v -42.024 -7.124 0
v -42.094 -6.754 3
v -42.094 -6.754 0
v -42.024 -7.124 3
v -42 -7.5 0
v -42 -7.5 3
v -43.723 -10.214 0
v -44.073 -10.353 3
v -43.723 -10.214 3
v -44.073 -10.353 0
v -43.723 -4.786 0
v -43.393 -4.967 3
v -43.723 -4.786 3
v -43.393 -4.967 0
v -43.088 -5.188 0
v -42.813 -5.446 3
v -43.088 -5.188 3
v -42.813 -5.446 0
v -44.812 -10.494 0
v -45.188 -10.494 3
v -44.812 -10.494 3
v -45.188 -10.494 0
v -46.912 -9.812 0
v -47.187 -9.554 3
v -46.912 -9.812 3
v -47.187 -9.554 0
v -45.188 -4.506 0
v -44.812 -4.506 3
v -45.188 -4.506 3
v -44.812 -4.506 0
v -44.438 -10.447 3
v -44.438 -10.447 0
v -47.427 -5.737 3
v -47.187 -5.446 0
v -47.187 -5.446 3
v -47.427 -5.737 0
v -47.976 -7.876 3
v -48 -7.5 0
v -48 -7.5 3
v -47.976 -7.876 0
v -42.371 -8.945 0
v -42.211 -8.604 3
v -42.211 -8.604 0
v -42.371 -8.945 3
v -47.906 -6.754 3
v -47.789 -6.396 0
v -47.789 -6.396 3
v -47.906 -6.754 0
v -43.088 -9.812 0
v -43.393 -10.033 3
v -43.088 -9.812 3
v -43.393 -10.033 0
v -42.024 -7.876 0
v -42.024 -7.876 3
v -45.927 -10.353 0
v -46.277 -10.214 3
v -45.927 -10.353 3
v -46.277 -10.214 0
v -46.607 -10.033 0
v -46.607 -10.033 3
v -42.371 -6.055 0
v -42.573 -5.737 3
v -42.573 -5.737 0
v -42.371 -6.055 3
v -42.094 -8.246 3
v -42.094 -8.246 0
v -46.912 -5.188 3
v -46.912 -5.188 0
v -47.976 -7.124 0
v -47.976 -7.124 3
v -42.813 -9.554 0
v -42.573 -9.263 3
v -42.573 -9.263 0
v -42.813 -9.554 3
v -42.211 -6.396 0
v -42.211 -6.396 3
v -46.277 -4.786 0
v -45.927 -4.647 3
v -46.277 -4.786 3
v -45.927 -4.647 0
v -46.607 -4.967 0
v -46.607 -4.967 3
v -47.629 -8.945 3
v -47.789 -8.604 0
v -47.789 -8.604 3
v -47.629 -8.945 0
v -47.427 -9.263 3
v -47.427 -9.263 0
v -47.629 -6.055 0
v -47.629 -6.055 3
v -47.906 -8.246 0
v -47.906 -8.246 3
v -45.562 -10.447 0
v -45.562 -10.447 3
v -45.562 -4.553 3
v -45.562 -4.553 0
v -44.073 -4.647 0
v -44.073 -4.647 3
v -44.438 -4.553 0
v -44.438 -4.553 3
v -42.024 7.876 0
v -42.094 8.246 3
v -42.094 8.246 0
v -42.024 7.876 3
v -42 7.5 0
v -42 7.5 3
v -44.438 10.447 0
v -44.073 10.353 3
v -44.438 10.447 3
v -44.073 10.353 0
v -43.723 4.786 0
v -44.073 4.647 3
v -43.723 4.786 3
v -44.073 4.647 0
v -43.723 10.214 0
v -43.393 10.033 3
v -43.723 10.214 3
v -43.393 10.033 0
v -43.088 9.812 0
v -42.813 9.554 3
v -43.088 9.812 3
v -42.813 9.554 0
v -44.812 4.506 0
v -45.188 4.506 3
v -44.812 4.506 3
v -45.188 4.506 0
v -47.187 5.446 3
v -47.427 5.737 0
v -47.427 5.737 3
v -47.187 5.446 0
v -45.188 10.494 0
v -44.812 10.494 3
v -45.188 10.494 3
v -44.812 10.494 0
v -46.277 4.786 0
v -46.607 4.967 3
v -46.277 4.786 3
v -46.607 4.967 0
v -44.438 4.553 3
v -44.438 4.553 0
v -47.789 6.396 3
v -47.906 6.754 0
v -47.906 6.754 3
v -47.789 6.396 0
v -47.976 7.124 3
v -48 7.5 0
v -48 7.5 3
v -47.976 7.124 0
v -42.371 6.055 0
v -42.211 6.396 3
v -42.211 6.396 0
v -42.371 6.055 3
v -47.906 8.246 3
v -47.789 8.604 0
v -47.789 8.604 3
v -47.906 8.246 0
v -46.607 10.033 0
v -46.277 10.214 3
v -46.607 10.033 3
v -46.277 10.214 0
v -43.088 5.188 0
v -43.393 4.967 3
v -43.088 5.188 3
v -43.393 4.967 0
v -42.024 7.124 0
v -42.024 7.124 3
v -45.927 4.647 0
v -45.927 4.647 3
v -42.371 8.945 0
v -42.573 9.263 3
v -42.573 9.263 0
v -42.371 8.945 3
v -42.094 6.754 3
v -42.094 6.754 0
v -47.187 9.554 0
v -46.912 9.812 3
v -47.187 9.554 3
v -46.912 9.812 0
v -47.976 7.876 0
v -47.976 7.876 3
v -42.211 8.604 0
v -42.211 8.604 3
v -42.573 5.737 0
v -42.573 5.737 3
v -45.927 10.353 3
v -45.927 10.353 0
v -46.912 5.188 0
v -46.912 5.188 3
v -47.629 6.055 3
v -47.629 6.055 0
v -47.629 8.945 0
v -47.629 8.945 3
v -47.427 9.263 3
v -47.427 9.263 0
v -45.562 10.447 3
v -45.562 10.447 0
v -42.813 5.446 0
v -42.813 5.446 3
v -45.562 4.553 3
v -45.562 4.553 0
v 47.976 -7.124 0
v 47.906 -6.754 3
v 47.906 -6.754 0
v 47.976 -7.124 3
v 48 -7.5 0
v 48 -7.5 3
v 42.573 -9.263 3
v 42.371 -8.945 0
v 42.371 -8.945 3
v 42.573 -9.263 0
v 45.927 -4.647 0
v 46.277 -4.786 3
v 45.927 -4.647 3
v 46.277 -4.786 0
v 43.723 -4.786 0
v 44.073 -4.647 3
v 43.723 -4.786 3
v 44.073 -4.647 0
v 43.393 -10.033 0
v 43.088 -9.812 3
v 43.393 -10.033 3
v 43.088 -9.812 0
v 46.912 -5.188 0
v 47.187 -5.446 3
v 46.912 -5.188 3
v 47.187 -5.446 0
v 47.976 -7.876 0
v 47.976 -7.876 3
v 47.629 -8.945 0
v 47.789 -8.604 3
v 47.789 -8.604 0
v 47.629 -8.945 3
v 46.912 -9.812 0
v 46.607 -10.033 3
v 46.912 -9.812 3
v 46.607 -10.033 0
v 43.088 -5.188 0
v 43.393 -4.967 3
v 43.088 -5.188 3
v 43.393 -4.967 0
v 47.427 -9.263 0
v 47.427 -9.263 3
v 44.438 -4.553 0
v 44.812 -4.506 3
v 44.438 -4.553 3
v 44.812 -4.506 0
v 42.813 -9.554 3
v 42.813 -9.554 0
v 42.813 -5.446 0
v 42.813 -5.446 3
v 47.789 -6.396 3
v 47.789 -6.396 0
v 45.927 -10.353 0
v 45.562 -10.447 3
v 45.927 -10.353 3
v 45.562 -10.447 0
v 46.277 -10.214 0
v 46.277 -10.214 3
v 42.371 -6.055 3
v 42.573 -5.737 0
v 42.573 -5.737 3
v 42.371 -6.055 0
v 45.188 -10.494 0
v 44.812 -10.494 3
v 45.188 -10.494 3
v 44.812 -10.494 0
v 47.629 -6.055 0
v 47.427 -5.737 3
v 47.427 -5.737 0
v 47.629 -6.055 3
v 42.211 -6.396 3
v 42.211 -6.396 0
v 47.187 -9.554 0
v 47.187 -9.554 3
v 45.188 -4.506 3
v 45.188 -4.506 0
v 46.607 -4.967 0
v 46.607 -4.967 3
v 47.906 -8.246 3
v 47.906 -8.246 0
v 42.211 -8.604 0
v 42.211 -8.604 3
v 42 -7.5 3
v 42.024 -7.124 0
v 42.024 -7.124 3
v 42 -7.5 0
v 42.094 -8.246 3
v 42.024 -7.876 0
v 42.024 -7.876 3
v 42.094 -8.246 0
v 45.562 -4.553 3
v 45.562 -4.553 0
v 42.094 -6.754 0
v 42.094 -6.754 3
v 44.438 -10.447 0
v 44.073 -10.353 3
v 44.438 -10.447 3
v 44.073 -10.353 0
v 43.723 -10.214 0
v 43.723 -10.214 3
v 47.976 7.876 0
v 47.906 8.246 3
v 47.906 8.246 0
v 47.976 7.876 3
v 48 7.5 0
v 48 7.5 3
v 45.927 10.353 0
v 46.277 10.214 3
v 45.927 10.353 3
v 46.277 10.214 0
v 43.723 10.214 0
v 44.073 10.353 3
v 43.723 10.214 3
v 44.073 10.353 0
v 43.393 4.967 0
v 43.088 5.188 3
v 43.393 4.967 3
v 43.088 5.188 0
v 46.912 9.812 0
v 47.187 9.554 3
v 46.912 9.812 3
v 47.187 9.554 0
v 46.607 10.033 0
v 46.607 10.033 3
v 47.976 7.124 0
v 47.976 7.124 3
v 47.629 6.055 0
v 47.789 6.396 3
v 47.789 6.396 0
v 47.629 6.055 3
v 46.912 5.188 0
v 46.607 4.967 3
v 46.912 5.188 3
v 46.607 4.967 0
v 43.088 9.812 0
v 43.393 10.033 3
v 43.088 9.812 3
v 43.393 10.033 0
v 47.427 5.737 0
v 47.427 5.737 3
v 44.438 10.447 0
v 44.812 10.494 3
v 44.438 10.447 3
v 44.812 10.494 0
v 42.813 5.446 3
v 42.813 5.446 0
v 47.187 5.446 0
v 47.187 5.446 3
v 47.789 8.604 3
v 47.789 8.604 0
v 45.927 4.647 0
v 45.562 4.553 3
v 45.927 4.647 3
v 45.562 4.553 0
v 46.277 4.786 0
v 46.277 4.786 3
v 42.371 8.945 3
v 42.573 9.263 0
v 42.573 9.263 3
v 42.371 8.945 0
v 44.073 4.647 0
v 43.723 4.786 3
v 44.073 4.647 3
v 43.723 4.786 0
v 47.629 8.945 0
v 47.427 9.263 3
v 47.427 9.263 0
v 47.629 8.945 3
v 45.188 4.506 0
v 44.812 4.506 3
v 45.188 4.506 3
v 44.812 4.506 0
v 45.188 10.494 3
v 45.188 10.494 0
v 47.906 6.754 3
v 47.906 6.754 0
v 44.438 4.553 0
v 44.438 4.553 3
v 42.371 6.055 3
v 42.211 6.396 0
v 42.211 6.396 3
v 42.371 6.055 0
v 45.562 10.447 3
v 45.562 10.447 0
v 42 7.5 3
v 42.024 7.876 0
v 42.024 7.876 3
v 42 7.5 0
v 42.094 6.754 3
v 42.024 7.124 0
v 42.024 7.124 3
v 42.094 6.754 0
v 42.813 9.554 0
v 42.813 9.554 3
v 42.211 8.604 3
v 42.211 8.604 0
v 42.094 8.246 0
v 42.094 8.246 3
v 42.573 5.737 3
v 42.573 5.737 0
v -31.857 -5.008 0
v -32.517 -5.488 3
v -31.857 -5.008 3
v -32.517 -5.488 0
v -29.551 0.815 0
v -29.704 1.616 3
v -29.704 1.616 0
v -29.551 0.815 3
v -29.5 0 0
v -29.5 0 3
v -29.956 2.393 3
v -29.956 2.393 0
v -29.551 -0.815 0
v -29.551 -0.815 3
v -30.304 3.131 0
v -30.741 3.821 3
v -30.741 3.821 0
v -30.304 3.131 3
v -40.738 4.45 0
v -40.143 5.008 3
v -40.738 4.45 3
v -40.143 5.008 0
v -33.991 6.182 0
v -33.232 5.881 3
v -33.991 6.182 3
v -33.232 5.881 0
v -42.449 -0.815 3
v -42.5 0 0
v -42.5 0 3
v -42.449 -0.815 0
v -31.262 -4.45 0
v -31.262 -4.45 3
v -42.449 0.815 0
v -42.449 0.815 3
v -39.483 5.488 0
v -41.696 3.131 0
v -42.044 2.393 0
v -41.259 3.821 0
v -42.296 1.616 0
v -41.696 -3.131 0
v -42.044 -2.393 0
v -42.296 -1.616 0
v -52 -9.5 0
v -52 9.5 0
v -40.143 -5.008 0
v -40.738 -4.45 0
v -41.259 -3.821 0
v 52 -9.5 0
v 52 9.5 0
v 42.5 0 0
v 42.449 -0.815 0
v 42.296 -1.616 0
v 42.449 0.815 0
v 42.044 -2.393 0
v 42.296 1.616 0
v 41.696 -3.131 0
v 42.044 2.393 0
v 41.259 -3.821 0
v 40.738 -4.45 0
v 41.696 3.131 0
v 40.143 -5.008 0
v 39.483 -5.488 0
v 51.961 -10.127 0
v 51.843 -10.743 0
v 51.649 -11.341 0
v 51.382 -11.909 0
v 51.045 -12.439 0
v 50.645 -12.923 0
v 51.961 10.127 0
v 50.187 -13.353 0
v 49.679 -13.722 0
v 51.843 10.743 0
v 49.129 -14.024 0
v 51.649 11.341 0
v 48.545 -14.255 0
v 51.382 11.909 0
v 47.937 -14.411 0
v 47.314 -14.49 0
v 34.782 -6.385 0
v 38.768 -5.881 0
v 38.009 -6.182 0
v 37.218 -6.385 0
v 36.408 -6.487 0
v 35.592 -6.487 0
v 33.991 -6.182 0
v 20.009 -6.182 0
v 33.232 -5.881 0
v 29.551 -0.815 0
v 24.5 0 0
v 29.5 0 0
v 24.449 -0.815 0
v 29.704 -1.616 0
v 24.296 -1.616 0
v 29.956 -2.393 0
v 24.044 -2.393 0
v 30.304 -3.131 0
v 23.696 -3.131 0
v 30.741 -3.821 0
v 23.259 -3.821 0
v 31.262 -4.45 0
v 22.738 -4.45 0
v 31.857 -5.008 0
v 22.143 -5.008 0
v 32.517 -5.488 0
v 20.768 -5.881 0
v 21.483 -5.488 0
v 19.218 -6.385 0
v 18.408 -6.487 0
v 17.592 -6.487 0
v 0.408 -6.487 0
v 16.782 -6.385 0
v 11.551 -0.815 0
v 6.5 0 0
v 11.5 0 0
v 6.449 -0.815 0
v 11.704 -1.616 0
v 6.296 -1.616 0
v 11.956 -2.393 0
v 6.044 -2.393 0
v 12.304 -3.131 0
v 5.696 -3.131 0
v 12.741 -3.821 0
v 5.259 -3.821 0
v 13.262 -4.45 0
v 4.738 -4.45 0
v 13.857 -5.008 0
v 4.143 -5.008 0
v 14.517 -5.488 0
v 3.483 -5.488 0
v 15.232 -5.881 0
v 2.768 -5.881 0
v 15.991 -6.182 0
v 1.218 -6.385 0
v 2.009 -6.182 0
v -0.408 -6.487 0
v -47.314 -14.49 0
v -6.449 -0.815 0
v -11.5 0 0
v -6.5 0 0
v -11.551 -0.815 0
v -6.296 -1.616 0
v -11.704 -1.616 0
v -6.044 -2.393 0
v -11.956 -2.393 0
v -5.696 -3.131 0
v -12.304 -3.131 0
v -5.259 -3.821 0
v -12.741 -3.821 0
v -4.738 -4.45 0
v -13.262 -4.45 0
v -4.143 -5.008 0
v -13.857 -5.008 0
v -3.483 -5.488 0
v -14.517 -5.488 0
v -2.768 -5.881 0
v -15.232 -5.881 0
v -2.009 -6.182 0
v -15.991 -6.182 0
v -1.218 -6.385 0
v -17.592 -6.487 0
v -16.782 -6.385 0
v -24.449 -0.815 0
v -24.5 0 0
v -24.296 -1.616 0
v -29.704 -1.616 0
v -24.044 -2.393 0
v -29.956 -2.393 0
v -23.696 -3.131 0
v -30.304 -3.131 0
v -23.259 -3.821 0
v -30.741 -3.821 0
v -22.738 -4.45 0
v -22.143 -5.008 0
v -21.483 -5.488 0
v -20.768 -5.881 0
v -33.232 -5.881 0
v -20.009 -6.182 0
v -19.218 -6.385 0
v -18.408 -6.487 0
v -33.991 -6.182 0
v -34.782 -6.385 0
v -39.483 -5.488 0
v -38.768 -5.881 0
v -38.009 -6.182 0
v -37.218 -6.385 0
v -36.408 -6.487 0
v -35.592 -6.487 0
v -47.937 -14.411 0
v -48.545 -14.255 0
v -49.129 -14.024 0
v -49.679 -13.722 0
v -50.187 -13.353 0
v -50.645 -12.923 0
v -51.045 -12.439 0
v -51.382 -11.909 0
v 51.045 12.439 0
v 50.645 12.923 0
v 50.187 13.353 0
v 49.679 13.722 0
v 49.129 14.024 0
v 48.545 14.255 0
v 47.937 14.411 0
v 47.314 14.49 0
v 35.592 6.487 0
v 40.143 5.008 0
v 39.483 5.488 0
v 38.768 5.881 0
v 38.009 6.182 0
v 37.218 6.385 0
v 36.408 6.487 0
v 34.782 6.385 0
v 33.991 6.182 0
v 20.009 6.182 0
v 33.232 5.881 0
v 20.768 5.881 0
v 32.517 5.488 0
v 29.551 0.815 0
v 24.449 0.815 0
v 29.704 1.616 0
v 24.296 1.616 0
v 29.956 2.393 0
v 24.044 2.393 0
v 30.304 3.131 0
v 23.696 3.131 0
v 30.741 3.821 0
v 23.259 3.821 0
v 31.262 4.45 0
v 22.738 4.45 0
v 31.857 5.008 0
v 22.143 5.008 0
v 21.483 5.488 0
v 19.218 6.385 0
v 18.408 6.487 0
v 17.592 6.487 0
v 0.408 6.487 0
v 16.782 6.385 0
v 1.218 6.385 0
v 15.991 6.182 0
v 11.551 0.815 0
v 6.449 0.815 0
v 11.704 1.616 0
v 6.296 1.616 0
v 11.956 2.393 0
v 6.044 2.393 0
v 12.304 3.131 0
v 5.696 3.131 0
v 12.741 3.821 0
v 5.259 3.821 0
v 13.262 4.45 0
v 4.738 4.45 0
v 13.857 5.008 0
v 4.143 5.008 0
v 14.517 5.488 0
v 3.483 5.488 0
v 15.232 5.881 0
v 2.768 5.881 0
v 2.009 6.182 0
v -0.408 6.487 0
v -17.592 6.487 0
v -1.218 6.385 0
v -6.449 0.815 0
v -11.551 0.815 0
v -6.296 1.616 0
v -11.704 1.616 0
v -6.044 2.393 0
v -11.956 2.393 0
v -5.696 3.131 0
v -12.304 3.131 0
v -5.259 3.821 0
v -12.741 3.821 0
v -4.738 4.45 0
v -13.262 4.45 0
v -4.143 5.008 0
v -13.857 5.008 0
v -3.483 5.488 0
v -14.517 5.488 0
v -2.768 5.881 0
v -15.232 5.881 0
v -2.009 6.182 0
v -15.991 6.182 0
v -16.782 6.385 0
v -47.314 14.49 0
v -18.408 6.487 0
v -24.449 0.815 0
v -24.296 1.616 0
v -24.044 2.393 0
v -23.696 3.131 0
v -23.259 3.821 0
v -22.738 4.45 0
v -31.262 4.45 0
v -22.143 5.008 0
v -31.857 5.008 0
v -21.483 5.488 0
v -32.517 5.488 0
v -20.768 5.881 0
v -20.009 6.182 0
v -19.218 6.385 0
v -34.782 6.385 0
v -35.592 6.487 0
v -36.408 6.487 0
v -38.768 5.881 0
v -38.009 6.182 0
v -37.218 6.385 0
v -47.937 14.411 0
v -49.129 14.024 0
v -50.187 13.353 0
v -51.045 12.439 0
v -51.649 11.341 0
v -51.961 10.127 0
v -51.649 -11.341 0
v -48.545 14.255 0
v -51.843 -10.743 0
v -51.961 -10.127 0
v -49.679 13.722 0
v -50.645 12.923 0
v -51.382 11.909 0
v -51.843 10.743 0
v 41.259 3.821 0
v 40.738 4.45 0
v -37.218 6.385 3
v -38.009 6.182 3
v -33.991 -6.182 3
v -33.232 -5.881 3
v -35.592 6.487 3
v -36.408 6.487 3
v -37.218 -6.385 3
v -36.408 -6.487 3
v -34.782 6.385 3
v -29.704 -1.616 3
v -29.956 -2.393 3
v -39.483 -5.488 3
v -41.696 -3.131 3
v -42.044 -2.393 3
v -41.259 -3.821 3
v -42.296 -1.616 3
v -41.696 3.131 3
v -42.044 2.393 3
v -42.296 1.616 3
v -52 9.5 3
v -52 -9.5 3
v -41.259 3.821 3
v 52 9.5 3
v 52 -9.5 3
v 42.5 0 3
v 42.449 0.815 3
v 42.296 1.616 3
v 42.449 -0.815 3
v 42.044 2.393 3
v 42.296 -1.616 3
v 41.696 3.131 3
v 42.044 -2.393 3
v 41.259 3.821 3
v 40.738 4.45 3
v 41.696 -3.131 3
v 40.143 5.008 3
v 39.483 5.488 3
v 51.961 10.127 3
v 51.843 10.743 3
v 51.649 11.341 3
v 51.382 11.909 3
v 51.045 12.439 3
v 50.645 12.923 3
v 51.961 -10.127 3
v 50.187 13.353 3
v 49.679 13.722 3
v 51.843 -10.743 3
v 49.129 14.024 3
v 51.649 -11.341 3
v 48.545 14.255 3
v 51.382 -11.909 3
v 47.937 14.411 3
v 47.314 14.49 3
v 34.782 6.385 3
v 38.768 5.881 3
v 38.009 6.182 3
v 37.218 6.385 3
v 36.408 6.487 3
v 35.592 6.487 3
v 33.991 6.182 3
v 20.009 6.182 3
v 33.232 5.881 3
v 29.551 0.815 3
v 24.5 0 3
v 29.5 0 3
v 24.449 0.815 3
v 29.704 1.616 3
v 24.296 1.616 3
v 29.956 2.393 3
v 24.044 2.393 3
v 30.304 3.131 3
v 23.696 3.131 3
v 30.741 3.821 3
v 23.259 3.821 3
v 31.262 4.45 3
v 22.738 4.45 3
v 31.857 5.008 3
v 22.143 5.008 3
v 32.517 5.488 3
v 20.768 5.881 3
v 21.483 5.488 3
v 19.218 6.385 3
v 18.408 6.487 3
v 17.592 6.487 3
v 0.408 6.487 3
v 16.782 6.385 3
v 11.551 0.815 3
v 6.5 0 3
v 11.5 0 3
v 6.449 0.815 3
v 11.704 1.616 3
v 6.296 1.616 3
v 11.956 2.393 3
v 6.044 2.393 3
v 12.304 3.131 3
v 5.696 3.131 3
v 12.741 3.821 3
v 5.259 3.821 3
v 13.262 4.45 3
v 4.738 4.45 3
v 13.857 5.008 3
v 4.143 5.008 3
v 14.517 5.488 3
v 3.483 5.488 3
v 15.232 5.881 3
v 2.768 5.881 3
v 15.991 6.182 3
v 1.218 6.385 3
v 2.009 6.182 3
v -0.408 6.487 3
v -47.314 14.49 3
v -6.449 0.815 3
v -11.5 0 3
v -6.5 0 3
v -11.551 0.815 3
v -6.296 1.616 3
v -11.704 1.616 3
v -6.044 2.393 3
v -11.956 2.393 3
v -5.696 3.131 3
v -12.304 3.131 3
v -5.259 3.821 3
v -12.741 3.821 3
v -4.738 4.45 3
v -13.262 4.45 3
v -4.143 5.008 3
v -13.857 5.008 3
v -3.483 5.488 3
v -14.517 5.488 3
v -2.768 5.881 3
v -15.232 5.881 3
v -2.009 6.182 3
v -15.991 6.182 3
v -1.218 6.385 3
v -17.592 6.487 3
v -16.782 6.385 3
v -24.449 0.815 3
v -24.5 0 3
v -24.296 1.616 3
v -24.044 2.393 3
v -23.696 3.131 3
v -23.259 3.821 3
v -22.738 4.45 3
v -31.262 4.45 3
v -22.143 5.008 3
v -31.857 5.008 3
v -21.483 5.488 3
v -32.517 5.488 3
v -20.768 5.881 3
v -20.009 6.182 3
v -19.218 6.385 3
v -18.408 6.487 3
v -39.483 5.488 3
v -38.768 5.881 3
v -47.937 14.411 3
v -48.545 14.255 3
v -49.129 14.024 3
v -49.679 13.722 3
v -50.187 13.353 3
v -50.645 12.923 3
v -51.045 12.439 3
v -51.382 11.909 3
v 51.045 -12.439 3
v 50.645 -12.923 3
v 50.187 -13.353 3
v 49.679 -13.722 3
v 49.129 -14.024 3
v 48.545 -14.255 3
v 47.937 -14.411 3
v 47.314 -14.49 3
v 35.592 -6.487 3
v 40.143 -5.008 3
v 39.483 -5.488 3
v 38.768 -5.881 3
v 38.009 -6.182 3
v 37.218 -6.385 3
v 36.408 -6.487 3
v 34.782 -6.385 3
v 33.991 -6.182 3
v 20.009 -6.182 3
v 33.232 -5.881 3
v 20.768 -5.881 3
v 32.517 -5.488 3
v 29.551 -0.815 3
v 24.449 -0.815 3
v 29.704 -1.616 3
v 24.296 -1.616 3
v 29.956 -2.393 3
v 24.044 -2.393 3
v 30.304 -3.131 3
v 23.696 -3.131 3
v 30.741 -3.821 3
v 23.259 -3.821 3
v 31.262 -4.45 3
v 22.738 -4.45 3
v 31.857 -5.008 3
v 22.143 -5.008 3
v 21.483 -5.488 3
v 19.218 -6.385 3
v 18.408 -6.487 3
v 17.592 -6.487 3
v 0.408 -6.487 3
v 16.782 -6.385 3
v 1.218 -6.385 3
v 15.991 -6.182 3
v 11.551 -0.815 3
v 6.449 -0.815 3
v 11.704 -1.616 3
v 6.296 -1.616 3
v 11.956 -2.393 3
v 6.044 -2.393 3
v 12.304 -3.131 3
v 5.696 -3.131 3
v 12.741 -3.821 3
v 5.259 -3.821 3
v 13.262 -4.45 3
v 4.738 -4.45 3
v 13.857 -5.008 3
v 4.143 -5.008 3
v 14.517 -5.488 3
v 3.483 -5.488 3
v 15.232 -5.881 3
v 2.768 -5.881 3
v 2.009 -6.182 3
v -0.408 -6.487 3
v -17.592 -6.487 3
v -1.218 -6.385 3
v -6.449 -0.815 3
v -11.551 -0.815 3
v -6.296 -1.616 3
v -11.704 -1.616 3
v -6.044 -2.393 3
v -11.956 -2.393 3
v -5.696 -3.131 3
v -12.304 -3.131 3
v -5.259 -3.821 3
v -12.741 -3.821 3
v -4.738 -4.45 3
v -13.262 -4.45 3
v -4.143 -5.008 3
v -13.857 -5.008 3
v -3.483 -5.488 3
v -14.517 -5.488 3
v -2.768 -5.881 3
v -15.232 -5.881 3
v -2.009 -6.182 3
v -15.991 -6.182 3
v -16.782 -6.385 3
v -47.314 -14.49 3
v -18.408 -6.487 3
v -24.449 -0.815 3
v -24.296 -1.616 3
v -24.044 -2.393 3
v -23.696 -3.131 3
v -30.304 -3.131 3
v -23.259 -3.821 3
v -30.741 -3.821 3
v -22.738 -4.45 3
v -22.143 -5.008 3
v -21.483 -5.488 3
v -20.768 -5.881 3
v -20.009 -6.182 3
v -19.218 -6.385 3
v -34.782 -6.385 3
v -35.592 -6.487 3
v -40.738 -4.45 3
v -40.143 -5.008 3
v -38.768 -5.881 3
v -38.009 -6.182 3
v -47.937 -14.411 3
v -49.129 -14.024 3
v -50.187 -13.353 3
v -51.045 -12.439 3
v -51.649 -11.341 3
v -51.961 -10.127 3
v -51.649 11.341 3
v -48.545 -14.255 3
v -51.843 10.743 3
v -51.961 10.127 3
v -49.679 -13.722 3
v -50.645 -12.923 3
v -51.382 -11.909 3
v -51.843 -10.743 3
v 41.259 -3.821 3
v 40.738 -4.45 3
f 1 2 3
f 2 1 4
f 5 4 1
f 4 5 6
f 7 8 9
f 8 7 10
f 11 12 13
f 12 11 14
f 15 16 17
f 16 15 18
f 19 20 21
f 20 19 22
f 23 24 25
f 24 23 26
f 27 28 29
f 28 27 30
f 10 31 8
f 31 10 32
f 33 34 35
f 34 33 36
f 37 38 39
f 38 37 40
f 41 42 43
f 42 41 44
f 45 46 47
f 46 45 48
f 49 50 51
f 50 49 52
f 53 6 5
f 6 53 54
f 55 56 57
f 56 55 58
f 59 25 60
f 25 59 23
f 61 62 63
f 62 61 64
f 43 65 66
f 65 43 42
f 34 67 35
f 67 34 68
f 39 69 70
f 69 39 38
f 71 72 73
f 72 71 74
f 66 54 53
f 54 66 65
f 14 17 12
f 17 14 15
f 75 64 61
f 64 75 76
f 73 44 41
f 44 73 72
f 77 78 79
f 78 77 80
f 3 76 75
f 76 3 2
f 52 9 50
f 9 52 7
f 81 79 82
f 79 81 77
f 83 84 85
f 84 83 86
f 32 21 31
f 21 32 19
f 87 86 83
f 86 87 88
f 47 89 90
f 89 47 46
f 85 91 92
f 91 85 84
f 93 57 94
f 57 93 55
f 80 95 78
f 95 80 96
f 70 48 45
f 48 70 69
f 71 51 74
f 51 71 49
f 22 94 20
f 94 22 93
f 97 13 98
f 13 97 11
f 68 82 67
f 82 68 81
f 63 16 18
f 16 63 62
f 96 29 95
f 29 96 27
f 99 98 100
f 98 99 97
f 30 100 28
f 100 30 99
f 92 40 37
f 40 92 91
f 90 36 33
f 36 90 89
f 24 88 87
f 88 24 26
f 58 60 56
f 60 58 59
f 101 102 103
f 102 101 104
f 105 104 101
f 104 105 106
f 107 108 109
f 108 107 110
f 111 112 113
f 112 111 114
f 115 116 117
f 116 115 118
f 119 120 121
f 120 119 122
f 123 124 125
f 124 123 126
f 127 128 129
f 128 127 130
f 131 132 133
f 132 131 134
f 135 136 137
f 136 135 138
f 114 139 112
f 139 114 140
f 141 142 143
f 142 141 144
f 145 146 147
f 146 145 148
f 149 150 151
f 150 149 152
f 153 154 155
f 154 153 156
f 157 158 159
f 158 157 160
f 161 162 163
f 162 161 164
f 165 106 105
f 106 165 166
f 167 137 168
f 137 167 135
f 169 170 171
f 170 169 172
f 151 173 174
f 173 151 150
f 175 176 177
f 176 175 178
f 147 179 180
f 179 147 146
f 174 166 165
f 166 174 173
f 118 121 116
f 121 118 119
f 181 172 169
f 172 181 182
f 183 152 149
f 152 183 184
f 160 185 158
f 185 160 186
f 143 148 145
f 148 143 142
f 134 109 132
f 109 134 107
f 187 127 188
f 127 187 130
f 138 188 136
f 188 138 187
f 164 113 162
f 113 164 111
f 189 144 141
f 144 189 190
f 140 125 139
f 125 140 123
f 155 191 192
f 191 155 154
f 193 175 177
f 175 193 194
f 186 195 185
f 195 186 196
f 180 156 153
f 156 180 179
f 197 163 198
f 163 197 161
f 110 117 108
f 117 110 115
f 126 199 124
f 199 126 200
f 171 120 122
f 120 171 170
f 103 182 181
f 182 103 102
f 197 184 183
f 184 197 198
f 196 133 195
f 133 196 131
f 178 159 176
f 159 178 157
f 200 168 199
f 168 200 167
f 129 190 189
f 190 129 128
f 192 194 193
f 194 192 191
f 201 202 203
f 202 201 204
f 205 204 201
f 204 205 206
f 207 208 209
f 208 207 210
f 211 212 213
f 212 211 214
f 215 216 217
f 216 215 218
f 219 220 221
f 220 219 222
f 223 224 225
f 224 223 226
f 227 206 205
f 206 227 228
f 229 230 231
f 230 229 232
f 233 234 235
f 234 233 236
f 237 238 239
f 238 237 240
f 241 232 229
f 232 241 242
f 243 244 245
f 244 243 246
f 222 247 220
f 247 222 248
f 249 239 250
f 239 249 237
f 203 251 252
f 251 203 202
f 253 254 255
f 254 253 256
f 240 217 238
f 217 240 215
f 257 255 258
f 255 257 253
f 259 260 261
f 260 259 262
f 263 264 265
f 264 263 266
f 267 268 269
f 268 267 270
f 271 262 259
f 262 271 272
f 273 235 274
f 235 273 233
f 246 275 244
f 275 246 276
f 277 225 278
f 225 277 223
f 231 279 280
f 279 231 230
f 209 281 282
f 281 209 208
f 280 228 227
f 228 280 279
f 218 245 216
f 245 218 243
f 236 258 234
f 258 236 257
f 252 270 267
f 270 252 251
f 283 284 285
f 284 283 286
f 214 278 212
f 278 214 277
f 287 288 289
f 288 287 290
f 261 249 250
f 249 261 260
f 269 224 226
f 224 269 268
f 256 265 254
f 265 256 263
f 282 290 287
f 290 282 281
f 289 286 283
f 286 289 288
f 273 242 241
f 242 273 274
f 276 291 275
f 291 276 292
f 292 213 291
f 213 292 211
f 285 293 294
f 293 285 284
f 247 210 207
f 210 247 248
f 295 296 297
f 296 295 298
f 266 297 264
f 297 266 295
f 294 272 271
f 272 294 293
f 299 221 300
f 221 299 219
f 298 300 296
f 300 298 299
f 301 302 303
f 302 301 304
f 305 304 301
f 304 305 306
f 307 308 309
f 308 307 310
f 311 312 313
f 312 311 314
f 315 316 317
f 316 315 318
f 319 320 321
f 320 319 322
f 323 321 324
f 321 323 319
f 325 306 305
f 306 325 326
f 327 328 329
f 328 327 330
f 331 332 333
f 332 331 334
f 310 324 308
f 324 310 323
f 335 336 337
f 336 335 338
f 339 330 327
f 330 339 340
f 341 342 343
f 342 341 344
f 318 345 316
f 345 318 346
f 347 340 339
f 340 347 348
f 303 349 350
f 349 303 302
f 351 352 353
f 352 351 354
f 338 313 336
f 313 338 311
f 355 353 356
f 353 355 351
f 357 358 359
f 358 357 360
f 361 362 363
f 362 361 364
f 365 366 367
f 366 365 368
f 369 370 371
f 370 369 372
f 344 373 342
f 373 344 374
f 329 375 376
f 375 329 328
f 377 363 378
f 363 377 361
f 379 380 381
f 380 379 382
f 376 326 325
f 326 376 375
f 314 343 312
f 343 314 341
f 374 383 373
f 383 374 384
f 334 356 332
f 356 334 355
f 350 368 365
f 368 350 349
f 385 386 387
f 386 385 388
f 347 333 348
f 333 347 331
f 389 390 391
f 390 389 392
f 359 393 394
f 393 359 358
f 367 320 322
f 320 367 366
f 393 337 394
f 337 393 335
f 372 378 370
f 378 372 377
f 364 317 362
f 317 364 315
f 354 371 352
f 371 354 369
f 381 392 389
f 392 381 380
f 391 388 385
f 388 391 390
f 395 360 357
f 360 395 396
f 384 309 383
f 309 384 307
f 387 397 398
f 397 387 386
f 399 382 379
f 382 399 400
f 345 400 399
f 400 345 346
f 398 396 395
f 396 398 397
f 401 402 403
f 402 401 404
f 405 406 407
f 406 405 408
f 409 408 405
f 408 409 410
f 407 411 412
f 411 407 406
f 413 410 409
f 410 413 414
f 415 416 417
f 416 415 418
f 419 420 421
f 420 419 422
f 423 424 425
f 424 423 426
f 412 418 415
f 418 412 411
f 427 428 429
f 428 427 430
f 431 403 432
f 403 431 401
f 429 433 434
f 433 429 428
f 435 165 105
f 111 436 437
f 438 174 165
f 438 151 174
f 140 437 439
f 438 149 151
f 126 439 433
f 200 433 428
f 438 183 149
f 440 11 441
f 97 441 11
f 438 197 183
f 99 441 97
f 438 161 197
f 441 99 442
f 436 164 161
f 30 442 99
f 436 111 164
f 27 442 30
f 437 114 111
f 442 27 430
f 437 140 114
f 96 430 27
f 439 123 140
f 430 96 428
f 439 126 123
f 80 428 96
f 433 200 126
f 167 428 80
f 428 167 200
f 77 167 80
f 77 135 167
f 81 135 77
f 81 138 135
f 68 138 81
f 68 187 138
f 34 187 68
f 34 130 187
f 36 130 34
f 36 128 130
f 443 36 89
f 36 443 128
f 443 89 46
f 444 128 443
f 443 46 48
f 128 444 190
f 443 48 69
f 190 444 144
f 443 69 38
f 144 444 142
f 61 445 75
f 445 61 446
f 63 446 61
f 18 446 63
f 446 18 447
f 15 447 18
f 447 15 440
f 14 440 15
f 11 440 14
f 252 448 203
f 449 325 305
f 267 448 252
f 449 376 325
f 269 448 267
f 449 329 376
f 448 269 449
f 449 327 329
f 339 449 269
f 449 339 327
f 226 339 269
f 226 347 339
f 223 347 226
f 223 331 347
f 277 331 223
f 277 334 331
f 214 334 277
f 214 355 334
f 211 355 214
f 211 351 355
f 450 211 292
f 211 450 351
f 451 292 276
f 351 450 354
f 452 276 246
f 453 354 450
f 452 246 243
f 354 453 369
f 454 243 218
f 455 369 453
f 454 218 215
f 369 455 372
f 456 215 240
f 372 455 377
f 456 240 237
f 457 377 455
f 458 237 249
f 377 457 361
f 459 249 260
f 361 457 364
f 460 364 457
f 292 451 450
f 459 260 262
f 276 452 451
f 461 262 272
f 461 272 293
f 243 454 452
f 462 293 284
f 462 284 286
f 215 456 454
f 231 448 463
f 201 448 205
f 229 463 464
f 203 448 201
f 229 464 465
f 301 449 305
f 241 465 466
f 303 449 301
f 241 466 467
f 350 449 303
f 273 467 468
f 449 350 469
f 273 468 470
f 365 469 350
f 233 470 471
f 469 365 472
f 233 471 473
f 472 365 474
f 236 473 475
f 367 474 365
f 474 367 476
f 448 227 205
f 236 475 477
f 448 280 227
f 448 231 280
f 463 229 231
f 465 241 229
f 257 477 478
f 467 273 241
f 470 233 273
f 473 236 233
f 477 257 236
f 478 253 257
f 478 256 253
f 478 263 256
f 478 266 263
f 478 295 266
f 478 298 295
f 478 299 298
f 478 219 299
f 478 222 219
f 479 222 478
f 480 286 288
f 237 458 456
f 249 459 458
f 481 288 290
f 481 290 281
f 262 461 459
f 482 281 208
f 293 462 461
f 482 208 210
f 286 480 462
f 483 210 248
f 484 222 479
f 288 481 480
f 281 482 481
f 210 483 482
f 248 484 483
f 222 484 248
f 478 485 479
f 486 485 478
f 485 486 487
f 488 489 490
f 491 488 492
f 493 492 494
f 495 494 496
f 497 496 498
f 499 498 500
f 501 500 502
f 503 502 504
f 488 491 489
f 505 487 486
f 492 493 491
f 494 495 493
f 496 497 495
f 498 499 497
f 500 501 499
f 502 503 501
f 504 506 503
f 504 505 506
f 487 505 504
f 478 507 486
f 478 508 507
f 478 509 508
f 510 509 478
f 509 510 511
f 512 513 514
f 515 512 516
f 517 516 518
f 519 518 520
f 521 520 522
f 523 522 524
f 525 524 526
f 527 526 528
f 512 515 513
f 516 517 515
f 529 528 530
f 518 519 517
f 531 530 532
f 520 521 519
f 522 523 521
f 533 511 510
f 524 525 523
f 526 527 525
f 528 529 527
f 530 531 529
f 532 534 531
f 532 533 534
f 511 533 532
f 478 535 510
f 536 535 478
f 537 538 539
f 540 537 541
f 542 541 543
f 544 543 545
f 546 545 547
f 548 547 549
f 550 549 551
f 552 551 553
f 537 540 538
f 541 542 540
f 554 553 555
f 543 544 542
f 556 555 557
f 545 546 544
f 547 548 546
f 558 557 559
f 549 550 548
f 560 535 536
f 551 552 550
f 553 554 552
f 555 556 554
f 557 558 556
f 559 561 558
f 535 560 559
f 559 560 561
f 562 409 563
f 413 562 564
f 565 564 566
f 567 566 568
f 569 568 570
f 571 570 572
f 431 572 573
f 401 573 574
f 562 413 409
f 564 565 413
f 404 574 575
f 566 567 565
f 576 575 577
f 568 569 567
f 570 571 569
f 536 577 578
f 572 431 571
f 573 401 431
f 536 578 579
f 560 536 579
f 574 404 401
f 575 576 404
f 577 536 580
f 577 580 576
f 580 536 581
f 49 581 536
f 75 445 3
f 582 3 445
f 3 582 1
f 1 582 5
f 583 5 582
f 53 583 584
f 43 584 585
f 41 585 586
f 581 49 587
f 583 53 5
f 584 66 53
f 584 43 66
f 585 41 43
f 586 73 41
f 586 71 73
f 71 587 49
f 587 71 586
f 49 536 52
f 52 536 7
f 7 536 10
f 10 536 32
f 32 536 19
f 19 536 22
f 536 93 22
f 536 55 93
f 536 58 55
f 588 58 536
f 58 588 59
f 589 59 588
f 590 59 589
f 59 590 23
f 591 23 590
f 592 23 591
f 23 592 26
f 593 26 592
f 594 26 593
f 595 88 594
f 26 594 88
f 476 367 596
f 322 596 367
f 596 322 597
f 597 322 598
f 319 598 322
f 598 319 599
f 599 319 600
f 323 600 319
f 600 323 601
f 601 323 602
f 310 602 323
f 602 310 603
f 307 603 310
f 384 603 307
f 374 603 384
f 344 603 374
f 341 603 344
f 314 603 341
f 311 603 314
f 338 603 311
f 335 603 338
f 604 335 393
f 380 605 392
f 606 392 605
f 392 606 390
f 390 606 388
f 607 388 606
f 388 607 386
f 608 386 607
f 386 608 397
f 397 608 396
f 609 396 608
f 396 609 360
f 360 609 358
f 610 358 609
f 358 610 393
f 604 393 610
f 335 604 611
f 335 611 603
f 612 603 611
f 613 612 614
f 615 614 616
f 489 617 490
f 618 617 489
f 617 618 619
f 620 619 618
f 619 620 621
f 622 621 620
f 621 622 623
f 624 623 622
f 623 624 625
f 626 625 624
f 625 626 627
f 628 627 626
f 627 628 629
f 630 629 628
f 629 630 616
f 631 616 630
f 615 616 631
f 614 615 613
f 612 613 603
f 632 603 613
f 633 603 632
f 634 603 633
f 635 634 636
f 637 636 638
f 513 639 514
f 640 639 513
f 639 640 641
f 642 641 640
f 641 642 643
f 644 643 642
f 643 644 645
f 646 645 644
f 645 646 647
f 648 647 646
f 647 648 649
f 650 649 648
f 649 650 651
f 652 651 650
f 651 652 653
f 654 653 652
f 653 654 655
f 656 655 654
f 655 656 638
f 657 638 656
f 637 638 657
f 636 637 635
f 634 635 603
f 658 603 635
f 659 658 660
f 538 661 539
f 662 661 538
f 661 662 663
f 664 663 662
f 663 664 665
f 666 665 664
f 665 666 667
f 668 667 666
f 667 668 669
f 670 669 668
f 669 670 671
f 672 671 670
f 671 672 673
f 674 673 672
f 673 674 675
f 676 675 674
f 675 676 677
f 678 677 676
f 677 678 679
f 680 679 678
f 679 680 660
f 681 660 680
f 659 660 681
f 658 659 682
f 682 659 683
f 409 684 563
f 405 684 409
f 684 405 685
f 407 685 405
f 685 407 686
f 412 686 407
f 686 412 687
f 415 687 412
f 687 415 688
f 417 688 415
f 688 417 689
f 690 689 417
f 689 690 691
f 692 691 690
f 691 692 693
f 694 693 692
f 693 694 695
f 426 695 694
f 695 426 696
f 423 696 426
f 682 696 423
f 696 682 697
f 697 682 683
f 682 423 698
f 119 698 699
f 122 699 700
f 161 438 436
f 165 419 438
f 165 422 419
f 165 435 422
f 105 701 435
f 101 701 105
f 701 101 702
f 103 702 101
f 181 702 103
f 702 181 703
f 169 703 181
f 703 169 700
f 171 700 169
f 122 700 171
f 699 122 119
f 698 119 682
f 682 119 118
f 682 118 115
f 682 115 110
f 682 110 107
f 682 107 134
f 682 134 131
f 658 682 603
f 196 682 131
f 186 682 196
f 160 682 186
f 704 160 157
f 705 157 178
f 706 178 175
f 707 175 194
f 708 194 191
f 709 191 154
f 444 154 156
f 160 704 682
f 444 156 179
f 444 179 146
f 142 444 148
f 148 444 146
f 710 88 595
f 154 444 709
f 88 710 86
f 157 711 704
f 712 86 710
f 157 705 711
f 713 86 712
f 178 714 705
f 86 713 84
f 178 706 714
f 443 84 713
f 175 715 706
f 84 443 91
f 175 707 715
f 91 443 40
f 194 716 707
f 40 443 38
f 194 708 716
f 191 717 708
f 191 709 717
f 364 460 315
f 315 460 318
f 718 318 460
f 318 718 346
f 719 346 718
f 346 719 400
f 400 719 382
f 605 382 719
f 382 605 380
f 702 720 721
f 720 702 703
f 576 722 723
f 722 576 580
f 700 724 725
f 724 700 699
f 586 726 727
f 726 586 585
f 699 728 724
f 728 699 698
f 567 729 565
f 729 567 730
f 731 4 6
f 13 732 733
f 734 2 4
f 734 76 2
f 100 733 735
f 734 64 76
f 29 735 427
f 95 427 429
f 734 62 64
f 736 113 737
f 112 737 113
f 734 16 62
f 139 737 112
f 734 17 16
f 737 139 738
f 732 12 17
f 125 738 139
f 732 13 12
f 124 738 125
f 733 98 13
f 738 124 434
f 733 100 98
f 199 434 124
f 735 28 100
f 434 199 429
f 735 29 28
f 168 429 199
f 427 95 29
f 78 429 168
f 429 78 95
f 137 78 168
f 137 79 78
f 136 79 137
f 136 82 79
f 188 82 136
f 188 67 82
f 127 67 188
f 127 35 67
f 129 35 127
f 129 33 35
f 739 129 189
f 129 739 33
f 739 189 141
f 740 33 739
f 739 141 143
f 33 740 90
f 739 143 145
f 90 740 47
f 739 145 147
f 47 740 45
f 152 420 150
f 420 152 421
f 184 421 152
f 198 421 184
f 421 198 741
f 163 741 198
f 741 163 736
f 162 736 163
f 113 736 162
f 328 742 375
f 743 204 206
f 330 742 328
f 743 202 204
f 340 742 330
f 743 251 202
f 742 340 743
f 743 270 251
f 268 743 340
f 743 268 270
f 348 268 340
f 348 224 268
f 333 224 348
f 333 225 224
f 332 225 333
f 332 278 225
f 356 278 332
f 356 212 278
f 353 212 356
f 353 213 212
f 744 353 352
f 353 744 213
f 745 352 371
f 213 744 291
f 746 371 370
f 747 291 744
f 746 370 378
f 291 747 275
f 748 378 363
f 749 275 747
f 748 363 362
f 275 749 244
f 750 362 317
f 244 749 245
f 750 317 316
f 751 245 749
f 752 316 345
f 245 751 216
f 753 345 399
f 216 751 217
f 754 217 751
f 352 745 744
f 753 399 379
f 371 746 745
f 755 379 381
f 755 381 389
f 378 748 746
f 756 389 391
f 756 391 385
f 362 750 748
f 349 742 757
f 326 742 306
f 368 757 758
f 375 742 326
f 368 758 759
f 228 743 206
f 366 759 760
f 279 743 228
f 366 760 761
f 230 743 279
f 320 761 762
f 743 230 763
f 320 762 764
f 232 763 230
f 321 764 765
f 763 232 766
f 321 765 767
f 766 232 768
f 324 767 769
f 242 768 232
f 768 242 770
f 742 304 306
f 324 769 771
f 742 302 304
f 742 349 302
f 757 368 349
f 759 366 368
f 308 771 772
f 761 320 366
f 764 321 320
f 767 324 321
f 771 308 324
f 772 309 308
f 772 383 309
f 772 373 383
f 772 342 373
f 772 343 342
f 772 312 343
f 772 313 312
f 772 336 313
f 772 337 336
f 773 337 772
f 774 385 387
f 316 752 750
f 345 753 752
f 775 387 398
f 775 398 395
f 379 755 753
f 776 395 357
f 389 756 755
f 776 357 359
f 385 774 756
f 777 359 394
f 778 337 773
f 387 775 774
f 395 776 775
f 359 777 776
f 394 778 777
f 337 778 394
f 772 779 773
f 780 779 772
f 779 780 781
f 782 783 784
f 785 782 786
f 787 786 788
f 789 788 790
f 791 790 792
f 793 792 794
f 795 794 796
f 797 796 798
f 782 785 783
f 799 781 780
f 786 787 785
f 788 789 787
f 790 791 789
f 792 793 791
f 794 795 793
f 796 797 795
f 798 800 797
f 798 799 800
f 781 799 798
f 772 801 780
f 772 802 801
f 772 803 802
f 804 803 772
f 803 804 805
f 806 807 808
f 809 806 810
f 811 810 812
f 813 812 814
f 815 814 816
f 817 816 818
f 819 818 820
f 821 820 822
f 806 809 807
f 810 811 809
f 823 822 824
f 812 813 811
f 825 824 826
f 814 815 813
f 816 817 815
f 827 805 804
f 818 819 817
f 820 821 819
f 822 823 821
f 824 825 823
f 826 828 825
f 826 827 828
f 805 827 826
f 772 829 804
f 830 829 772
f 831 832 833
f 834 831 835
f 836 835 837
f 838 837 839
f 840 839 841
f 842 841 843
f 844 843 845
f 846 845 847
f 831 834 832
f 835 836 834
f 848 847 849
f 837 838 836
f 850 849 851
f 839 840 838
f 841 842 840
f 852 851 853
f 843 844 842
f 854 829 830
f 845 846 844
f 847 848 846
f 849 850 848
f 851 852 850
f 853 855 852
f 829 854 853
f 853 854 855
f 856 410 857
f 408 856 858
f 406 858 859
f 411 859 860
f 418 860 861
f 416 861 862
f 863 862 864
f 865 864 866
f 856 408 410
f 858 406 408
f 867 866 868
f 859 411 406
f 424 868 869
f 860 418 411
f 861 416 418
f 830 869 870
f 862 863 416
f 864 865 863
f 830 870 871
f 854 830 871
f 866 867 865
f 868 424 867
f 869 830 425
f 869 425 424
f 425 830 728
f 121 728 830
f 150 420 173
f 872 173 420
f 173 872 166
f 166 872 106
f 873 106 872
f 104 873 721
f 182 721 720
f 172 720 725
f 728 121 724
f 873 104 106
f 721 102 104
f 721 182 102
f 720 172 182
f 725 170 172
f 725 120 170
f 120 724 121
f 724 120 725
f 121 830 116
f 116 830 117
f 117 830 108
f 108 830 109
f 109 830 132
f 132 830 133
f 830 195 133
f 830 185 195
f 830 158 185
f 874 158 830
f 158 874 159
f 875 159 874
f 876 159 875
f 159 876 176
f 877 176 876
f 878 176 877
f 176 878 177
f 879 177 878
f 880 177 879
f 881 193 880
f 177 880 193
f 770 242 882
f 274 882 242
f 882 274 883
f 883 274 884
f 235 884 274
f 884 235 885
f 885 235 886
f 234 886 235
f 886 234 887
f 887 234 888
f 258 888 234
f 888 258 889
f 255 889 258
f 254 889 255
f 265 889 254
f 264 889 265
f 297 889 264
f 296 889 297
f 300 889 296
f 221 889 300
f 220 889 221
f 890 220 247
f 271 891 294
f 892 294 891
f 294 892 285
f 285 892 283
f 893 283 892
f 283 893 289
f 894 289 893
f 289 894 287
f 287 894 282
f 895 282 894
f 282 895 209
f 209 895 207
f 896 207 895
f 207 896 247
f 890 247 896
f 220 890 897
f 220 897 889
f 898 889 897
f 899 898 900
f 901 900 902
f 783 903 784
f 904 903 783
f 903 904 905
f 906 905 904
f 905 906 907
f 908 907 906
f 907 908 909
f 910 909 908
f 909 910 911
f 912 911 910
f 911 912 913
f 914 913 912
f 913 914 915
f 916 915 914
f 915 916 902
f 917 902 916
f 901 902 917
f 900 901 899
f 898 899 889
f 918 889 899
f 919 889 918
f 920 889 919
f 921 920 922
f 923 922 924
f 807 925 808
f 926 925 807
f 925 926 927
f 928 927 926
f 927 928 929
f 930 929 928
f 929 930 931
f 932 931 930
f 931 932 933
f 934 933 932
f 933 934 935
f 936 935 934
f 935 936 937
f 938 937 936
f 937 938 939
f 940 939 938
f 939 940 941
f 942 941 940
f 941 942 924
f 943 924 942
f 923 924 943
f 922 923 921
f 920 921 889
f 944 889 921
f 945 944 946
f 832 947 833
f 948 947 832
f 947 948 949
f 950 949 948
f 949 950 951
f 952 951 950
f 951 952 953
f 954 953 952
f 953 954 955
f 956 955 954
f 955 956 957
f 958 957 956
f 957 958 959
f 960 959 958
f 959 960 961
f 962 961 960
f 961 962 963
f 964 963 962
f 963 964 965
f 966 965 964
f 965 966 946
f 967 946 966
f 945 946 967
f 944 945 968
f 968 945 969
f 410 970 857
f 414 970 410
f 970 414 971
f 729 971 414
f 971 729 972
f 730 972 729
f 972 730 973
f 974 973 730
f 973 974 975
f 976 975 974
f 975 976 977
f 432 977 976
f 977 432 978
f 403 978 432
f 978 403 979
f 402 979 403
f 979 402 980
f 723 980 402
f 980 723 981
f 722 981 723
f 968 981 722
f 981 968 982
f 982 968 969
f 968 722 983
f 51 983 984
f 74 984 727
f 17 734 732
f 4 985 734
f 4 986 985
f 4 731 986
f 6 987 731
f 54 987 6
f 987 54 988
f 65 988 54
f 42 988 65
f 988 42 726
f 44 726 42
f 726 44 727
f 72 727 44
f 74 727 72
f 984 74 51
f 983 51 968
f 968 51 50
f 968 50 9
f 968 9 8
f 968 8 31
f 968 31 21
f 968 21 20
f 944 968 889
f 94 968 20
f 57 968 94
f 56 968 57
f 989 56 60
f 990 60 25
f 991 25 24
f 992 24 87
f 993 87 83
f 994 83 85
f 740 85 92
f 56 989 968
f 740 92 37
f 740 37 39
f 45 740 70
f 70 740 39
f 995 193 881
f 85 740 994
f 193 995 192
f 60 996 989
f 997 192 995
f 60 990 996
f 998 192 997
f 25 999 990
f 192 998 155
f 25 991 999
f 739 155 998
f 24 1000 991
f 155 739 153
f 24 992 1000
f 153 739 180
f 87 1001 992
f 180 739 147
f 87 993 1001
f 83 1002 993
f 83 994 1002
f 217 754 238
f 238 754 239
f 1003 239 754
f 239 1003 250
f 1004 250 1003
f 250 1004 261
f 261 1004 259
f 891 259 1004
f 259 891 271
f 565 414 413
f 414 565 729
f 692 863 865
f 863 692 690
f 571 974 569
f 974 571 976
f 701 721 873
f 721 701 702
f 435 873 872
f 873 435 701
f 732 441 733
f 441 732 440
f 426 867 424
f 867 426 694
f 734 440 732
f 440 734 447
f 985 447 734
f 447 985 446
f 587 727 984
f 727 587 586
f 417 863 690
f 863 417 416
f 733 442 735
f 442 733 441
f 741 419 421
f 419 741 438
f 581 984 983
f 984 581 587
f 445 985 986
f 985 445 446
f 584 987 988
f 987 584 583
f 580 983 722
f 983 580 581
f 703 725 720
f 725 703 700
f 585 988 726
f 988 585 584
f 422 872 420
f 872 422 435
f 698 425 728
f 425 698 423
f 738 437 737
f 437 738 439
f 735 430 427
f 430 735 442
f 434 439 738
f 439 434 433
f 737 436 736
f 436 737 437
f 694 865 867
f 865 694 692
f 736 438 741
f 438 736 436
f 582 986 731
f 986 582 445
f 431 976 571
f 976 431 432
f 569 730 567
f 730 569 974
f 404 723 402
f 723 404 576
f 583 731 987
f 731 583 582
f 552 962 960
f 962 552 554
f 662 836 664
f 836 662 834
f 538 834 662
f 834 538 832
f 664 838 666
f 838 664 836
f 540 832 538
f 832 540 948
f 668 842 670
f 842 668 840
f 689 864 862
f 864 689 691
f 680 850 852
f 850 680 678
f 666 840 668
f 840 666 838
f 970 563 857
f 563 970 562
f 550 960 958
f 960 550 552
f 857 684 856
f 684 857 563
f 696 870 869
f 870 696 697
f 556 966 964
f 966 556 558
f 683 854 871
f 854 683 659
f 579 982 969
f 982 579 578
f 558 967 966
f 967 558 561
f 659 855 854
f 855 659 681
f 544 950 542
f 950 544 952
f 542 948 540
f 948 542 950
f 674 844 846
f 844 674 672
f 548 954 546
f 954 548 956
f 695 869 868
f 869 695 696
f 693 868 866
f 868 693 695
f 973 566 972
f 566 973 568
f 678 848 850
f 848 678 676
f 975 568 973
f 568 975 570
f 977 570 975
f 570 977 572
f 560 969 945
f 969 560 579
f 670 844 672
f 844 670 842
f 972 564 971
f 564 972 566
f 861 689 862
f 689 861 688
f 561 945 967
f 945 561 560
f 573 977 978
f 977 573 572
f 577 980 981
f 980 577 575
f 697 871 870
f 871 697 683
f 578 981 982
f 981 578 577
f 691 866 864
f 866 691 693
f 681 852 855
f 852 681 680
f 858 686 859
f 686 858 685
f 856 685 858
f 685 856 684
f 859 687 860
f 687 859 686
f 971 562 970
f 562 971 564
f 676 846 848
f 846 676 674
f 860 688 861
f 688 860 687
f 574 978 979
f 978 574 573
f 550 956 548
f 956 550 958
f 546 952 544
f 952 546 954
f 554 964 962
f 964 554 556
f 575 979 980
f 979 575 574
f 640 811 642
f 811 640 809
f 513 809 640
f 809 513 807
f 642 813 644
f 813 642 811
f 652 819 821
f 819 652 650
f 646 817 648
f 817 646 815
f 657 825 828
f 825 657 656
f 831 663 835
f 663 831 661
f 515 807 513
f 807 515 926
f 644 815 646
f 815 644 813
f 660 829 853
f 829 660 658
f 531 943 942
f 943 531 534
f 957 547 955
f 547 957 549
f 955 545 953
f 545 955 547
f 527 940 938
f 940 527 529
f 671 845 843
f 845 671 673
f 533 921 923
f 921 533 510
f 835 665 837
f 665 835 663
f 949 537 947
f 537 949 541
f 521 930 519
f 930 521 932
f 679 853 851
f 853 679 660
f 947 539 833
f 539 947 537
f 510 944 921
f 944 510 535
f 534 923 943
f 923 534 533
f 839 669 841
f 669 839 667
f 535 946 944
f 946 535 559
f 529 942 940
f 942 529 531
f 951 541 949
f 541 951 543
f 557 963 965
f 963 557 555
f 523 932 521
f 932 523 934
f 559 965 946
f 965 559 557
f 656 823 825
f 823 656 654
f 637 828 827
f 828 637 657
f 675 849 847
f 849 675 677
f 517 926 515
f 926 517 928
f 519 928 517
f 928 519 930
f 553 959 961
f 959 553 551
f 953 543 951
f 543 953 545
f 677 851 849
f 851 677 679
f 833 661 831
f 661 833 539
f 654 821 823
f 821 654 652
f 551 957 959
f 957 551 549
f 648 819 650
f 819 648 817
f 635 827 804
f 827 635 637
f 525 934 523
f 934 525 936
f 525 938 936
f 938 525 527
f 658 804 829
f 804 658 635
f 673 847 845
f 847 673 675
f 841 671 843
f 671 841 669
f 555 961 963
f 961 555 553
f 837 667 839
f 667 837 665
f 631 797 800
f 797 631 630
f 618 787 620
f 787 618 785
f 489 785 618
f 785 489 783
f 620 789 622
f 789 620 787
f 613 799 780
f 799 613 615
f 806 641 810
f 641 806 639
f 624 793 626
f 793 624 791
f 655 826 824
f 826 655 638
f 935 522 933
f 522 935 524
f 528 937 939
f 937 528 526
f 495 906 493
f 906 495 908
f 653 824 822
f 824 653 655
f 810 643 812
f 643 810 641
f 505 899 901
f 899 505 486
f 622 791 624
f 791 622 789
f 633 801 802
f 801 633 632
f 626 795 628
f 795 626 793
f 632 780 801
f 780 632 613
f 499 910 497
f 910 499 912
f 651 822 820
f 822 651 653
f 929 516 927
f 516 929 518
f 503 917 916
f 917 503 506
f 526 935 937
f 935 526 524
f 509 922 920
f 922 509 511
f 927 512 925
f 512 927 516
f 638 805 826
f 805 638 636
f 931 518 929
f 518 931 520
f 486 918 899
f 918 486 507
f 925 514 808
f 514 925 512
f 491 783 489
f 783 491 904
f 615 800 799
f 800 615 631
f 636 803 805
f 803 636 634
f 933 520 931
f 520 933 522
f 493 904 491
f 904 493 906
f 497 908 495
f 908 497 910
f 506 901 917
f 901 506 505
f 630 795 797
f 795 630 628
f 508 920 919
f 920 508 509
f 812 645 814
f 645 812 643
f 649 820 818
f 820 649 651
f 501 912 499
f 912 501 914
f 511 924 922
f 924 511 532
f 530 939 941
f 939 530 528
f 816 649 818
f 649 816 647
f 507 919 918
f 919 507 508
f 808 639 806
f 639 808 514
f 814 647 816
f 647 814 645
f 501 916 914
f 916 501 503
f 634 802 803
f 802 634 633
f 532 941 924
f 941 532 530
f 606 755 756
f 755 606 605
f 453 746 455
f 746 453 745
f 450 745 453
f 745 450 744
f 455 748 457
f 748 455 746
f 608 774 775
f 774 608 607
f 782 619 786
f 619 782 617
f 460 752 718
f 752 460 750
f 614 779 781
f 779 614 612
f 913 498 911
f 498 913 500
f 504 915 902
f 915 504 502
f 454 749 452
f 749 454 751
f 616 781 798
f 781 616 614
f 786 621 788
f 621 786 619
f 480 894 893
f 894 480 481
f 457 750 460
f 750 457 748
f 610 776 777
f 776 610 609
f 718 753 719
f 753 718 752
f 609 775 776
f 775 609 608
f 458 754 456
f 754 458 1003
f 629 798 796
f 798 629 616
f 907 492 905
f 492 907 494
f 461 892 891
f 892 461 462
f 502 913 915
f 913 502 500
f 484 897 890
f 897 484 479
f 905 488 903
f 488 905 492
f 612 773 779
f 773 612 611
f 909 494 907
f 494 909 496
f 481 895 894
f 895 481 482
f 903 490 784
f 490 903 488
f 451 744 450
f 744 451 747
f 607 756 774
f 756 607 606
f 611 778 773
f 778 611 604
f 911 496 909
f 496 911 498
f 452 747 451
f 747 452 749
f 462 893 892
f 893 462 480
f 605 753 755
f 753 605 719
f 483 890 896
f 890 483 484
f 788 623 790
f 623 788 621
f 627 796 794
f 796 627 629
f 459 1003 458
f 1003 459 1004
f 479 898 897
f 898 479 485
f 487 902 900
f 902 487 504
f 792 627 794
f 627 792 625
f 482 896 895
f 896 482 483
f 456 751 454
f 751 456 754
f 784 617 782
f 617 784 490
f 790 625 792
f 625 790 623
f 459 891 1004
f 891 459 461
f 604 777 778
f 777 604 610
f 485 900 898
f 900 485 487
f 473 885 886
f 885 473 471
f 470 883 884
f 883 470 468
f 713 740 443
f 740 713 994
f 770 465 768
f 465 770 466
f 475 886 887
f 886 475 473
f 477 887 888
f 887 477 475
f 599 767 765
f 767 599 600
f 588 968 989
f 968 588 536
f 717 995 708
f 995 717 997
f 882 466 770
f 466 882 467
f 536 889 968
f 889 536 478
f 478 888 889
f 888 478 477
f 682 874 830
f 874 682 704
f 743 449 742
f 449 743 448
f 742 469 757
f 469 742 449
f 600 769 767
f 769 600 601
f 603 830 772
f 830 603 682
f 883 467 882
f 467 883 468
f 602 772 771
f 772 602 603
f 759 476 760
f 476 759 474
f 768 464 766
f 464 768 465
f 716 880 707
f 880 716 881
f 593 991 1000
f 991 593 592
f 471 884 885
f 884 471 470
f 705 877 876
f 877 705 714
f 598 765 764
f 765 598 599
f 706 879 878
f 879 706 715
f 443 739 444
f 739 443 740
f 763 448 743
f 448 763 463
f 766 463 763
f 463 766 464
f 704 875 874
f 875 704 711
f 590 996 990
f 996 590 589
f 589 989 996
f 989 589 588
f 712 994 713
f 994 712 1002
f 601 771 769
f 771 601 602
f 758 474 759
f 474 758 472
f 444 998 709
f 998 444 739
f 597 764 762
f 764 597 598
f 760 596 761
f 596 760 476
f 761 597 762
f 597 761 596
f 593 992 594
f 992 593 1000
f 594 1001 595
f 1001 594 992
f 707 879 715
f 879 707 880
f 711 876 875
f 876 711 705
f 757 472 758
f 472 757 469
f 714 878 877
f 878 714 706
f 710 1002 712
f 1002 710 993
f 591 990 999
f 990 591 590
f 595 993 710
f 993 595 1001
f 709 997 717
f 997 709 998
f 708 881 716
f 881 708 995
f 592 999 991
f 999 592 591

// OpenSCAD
$fn = 50;


difference() {
	union() {
		hull() {
			translate(v = [-47.0000000000, 9.5000000000, 0]) {
				cylinder(h = 3, r = 5);
			}
			translate(v = [47.0000000000, 9.5000000000, 0]) {
				cylinder(h = 3, r = 5);
			}
			translate(v = [-47.0000000000, -9.5000000000, 0]) {
				cylinder(h = 3, r = 5);
			}
			translate(v = [47.0000000000, -9.5000000000, 0]) {
				cylinder(h = 3, r = 5);
			}
		}
	}
	union() {
		#translate(v = [-45.0000000000, -7.5000000000, -100.0000000000]) {
			cylinder(h = 200, r = 3.0000000000);
		}
		#translate(v = [-45.0000000000, 7.5000000000, -100.0000000000]) {
			cylinder(h = 200, r = 3.0000000000);
		}
		#translate(v = [45.0000000000, -7.5000000000, -100.0000000000]) {
			cylinder(h = 200, r = 3.0000000000);
		}
		#translate(v = [45.0000000000, 7.5000000000, -100.0000000000]) {
			cylinder(h = 200, r = 3.0000000000);
		}
		#translate(v = [-36.0000000000, 0, 0]) {
			cylinder(h = 3, r = 6.5000000000);
		}
		#translate(v = [-18.0000000000, 0, 0]) {
			cylinder(h = 3, r = 6.5000000000);
		}
		#cylinder(h = 3, r = 6.5000000000);
		#translate(v = [18.0000000000, 0, 0]) {
			cylinder(h = 3, r = 6.5000000000);
		}
		#translate(v = [36.0000000000, 0, 0]) {
			cylinder(h = 3, r = 6.5000000000);
		}
	}
}
